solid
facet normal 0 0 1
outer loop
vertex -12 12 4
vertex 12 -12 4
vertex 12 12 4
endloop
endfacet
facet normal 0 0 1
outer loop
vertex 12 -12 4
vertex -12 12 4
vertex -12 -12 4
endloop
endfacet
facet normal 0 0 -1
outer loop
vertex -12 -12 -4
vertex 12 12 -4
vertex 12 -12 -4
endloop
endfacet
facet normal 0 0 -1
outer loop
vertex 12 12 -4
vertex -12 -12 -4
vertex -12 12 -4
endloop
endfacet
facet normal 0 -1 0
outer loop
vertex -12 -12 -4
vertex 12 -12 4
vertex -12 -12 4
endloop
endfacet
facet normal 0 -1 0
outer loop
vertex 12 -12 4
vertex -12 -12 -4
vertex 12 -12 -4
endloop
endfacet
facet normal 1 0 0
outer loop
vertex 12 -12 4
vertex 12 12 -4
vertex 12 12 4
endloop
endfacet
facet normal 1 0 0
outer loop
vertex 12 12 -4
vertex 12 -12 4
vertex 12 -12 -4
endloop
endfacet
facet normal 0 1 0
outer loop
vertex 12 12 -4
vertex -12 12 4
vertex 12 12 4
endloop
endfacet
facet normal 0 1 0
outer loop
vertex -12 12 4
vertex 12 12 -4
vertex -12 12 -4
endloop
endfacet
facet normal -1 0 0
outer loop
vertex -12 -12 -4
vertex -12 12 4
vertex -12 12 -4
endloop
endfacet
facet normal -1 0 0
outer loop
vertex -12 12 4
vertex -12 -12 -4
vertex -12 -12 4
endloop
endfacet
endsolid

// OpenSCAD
size = 32;//block=32 //item=8


cube([size * 0.75, size * 0.75, size * 0.25], center = true);
